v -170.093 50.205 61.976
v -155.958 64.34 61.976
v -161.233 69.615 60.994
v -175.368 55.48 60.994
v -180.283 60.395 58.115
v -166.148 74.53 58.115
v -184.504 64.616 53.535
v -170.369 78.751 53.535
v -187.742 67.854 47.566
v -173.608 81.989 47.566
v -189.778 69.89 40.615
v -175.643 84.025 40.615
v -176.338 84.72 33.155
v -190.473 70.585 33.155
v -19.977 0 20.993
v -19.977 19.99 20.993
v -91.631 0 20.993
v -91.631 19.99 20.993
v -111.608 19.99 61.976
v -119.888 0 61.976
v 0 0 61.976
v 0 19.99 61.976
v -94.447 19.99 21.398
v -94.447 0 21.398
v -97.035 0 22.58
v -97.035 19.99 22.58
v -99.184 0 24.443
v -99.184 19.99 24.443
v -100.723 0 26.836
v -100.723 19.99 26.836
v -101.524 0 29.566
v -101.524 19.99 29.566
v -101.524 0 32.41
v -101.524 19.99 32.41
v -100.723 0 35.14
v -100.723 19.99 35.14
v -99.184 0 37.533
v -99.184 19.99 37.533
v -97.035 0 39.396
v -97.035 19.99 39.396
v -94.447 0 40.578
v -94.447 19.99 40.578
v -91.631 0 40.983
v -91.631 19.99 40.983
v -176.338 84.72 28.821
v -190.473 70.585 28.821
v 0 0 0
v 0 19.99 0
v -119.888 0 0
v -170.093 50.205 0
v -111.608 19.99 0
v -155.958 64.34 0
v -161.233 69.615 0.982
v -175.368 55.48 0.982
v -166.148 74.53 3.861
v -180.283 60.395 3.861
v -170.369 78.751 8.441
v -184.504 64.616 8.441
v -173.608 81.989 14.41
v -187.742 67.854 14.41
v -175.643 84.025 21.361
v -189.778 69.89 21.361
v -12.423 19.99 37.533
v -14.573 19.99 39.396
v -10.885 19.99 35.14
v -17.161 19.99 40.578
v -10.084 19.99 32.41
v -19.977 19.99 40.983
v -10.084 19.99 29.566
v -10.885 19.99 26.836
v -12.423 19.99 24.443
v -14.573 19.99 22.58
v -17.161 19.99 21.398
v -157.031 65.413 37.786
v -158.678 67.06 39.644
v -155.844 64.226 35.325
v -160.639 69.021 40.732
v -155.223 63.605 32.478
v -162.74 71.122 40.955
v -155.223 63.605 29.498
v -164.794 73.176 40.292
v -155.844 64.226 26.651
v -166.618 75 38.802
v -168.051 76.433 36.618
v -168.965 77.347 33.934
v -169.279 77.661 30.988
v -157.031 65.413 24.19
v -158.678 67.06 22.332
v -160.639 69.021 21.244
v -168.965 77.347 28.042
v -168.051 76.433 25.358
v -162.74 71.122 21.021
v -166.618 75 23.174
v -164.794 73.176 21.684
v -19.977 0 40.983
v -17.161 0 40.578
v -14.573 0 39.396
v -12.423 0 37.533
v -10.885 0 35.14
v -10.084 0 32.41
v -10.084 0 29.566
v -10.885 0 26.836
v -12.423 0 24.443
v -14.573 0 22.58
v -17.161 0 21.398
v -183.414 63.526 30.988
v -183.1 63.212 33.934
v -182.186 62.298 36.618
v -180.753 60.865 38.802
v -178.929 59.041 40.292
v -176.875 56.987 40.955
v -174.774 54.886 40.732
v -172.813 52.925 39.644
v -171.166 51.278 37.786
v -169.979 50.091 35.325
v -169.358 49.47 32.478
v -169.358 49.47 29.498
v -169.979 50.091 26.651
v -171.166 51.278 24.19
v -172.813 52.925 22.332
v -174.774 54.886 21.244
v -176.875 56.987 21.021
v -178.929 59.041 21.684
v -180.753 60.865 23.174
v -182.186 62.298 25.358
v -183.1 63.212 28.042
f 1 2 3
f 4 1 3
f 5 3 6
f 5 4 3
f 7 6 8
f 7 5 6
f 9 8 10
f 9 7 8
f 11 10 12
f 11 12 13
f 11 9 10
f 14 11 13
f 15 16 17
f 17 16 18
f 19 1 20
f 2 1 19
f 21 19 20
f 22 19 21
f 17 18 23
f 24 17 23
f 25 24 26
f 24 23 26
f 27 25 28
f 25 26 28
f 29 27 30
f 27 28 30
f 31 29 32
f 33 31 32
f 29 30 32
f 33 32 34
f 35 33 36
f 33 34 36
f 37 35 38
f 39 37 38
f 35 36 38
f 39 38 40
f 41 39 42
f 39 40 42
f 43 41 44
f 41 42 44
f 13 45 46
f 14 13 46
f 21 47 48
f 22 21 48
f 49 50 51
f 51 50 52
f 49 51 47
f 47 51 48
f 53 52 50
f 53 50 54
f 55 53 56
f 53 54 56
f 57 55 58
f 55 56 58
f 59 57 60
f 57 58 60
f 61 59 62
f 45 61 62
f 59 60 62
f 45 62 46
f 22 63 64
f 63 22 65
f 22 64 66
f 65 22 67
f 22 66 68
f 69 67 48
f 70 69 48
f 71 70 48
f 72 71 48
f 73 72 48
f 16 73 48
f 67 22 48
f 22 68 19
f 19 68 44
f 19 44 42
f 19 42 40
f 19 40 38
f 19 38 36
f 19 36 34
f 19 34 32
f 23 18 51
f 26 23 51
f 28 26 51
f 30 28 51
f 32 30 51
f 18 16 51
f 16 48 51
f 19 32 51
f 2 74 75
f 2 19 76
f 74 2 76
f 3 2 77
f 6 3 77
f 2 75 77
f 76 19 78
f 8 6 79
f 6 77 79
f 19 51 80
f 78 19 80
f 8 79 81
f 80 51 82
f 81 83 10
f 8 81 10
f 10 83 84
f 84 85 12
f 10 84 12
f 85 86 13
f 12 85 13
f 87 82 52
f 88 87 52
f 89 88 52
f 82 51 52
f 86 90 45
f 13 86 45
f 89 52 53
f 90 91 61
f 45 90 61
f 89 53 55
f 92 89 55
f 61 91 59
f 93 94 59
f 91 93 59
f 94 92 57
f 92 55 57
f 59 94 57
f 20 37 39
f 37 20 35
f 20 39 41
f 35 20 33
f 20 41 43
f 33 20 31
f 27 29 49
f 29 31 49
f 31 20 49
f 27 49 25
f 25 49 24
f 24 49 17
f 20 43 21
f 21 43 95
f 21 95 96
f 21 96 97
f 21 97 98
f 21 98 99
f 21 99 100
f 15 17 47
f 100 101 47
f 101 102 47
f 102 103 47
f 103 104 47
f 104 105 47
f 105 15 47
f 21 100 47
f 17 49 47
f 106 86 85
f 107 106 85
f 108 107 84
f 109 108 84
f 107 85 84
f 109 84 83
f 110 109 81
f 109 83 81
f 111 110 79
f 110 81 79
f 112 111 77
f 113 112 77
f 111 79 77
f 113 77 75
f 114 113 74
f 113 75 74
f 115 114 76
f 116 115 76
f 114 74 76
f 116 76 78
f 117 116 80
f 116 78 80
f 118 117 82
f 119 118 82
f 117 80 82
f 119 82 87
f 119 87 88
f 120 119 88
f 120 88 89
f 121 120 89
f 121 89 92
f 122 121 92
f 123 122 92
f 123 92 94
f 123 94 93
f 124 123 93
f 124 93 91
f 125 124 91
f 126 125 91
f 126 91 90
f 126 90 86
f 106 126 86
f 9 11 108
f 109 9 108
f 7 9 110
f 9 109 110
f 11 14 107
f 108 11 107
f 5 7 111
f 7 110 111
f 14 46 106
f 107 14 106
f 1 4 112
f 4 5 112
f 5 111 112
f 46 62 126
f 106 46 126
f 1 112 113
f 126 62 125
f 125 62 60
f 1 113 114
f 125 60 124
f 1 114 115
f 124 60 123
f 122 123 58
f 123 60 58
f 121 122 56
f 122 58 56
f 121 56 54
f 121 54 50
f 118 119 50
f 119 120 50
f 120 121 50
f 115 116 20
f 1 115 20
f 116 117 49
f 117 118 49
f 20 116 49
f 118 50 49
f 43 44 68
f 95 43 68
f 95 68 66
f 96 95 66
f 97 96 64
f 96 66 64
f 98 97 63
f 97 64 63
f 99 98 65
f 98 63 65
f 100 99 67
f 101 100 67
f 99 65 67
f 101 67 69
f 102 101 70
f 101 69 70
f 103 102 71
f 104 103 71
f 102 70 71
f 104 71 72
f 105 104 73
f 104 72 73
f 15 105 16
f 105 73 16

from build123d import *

# Parameters (mm, degrees)
F1_DEPTH = 61.976
F3_DEPTH = 35.814
F4_R     = 9.9949
F5_DEPTH = 42.926
F6_R     = 28.820882


with BuildPart() as f1:
    # F0 (on Top) → F1 (new body)
    with BuildSketch(Plane.XY):
        Polygon((-119.888, 0), (0, 0), (0, 19.9898), (-111.607954, 19.9898), (-176.33789, 84.719736), (-190.472813, 70.584813), align=None)
    extrude(amount=F1_DEPTH)

    # F2 (on face) → F3 (cut)
    with BuildSketch(Plane(origin=(0, 19.9898, 0), x_dir=(-1, 0, 0), z_dir=(0, 1, 0))):
        with BuildLine():
            Line((91.630854, 40.9829), (19.9771, 40.9829))
            ThreePointArc((19.9771, 40.9829), (9.9822, 30.988), (19.9771, 20.9931))
            Line((19.9771, 20.9931), (91.630854, 20.9931))
            ThreePointArc((91.630854, 20.9931), (101.625754, 30.988), (91.630854, 40.9829))
        make_face()
    extrude(amount=-F3_DEPTH, mode=Mode.SUBTRACT)

    # F4 (on face) → F5 (cut)
    with BuildSketch(Plane(origin=(-45.809077, -45.809077, 0), x_dir=(-0.707107, 0.707107, 0), z_dir=(0.707107, 0.707107, 0))):
        with Locations((164.618518, 30.988)):
            Circle(F4_R)
    extrude(amount=-F5_DEPTH, mode=Mode.SUBTRACT)

    # F6
    f6_edges = [f1.edges().sort_by_distance(p)[0] for p in [
        (-183.405352, 77.652275, 0),
        (-183.405352, 77.652275, 61.976),
    ]]
    fillet(f6_edges, radius=F6_R)


solid = f1.part
